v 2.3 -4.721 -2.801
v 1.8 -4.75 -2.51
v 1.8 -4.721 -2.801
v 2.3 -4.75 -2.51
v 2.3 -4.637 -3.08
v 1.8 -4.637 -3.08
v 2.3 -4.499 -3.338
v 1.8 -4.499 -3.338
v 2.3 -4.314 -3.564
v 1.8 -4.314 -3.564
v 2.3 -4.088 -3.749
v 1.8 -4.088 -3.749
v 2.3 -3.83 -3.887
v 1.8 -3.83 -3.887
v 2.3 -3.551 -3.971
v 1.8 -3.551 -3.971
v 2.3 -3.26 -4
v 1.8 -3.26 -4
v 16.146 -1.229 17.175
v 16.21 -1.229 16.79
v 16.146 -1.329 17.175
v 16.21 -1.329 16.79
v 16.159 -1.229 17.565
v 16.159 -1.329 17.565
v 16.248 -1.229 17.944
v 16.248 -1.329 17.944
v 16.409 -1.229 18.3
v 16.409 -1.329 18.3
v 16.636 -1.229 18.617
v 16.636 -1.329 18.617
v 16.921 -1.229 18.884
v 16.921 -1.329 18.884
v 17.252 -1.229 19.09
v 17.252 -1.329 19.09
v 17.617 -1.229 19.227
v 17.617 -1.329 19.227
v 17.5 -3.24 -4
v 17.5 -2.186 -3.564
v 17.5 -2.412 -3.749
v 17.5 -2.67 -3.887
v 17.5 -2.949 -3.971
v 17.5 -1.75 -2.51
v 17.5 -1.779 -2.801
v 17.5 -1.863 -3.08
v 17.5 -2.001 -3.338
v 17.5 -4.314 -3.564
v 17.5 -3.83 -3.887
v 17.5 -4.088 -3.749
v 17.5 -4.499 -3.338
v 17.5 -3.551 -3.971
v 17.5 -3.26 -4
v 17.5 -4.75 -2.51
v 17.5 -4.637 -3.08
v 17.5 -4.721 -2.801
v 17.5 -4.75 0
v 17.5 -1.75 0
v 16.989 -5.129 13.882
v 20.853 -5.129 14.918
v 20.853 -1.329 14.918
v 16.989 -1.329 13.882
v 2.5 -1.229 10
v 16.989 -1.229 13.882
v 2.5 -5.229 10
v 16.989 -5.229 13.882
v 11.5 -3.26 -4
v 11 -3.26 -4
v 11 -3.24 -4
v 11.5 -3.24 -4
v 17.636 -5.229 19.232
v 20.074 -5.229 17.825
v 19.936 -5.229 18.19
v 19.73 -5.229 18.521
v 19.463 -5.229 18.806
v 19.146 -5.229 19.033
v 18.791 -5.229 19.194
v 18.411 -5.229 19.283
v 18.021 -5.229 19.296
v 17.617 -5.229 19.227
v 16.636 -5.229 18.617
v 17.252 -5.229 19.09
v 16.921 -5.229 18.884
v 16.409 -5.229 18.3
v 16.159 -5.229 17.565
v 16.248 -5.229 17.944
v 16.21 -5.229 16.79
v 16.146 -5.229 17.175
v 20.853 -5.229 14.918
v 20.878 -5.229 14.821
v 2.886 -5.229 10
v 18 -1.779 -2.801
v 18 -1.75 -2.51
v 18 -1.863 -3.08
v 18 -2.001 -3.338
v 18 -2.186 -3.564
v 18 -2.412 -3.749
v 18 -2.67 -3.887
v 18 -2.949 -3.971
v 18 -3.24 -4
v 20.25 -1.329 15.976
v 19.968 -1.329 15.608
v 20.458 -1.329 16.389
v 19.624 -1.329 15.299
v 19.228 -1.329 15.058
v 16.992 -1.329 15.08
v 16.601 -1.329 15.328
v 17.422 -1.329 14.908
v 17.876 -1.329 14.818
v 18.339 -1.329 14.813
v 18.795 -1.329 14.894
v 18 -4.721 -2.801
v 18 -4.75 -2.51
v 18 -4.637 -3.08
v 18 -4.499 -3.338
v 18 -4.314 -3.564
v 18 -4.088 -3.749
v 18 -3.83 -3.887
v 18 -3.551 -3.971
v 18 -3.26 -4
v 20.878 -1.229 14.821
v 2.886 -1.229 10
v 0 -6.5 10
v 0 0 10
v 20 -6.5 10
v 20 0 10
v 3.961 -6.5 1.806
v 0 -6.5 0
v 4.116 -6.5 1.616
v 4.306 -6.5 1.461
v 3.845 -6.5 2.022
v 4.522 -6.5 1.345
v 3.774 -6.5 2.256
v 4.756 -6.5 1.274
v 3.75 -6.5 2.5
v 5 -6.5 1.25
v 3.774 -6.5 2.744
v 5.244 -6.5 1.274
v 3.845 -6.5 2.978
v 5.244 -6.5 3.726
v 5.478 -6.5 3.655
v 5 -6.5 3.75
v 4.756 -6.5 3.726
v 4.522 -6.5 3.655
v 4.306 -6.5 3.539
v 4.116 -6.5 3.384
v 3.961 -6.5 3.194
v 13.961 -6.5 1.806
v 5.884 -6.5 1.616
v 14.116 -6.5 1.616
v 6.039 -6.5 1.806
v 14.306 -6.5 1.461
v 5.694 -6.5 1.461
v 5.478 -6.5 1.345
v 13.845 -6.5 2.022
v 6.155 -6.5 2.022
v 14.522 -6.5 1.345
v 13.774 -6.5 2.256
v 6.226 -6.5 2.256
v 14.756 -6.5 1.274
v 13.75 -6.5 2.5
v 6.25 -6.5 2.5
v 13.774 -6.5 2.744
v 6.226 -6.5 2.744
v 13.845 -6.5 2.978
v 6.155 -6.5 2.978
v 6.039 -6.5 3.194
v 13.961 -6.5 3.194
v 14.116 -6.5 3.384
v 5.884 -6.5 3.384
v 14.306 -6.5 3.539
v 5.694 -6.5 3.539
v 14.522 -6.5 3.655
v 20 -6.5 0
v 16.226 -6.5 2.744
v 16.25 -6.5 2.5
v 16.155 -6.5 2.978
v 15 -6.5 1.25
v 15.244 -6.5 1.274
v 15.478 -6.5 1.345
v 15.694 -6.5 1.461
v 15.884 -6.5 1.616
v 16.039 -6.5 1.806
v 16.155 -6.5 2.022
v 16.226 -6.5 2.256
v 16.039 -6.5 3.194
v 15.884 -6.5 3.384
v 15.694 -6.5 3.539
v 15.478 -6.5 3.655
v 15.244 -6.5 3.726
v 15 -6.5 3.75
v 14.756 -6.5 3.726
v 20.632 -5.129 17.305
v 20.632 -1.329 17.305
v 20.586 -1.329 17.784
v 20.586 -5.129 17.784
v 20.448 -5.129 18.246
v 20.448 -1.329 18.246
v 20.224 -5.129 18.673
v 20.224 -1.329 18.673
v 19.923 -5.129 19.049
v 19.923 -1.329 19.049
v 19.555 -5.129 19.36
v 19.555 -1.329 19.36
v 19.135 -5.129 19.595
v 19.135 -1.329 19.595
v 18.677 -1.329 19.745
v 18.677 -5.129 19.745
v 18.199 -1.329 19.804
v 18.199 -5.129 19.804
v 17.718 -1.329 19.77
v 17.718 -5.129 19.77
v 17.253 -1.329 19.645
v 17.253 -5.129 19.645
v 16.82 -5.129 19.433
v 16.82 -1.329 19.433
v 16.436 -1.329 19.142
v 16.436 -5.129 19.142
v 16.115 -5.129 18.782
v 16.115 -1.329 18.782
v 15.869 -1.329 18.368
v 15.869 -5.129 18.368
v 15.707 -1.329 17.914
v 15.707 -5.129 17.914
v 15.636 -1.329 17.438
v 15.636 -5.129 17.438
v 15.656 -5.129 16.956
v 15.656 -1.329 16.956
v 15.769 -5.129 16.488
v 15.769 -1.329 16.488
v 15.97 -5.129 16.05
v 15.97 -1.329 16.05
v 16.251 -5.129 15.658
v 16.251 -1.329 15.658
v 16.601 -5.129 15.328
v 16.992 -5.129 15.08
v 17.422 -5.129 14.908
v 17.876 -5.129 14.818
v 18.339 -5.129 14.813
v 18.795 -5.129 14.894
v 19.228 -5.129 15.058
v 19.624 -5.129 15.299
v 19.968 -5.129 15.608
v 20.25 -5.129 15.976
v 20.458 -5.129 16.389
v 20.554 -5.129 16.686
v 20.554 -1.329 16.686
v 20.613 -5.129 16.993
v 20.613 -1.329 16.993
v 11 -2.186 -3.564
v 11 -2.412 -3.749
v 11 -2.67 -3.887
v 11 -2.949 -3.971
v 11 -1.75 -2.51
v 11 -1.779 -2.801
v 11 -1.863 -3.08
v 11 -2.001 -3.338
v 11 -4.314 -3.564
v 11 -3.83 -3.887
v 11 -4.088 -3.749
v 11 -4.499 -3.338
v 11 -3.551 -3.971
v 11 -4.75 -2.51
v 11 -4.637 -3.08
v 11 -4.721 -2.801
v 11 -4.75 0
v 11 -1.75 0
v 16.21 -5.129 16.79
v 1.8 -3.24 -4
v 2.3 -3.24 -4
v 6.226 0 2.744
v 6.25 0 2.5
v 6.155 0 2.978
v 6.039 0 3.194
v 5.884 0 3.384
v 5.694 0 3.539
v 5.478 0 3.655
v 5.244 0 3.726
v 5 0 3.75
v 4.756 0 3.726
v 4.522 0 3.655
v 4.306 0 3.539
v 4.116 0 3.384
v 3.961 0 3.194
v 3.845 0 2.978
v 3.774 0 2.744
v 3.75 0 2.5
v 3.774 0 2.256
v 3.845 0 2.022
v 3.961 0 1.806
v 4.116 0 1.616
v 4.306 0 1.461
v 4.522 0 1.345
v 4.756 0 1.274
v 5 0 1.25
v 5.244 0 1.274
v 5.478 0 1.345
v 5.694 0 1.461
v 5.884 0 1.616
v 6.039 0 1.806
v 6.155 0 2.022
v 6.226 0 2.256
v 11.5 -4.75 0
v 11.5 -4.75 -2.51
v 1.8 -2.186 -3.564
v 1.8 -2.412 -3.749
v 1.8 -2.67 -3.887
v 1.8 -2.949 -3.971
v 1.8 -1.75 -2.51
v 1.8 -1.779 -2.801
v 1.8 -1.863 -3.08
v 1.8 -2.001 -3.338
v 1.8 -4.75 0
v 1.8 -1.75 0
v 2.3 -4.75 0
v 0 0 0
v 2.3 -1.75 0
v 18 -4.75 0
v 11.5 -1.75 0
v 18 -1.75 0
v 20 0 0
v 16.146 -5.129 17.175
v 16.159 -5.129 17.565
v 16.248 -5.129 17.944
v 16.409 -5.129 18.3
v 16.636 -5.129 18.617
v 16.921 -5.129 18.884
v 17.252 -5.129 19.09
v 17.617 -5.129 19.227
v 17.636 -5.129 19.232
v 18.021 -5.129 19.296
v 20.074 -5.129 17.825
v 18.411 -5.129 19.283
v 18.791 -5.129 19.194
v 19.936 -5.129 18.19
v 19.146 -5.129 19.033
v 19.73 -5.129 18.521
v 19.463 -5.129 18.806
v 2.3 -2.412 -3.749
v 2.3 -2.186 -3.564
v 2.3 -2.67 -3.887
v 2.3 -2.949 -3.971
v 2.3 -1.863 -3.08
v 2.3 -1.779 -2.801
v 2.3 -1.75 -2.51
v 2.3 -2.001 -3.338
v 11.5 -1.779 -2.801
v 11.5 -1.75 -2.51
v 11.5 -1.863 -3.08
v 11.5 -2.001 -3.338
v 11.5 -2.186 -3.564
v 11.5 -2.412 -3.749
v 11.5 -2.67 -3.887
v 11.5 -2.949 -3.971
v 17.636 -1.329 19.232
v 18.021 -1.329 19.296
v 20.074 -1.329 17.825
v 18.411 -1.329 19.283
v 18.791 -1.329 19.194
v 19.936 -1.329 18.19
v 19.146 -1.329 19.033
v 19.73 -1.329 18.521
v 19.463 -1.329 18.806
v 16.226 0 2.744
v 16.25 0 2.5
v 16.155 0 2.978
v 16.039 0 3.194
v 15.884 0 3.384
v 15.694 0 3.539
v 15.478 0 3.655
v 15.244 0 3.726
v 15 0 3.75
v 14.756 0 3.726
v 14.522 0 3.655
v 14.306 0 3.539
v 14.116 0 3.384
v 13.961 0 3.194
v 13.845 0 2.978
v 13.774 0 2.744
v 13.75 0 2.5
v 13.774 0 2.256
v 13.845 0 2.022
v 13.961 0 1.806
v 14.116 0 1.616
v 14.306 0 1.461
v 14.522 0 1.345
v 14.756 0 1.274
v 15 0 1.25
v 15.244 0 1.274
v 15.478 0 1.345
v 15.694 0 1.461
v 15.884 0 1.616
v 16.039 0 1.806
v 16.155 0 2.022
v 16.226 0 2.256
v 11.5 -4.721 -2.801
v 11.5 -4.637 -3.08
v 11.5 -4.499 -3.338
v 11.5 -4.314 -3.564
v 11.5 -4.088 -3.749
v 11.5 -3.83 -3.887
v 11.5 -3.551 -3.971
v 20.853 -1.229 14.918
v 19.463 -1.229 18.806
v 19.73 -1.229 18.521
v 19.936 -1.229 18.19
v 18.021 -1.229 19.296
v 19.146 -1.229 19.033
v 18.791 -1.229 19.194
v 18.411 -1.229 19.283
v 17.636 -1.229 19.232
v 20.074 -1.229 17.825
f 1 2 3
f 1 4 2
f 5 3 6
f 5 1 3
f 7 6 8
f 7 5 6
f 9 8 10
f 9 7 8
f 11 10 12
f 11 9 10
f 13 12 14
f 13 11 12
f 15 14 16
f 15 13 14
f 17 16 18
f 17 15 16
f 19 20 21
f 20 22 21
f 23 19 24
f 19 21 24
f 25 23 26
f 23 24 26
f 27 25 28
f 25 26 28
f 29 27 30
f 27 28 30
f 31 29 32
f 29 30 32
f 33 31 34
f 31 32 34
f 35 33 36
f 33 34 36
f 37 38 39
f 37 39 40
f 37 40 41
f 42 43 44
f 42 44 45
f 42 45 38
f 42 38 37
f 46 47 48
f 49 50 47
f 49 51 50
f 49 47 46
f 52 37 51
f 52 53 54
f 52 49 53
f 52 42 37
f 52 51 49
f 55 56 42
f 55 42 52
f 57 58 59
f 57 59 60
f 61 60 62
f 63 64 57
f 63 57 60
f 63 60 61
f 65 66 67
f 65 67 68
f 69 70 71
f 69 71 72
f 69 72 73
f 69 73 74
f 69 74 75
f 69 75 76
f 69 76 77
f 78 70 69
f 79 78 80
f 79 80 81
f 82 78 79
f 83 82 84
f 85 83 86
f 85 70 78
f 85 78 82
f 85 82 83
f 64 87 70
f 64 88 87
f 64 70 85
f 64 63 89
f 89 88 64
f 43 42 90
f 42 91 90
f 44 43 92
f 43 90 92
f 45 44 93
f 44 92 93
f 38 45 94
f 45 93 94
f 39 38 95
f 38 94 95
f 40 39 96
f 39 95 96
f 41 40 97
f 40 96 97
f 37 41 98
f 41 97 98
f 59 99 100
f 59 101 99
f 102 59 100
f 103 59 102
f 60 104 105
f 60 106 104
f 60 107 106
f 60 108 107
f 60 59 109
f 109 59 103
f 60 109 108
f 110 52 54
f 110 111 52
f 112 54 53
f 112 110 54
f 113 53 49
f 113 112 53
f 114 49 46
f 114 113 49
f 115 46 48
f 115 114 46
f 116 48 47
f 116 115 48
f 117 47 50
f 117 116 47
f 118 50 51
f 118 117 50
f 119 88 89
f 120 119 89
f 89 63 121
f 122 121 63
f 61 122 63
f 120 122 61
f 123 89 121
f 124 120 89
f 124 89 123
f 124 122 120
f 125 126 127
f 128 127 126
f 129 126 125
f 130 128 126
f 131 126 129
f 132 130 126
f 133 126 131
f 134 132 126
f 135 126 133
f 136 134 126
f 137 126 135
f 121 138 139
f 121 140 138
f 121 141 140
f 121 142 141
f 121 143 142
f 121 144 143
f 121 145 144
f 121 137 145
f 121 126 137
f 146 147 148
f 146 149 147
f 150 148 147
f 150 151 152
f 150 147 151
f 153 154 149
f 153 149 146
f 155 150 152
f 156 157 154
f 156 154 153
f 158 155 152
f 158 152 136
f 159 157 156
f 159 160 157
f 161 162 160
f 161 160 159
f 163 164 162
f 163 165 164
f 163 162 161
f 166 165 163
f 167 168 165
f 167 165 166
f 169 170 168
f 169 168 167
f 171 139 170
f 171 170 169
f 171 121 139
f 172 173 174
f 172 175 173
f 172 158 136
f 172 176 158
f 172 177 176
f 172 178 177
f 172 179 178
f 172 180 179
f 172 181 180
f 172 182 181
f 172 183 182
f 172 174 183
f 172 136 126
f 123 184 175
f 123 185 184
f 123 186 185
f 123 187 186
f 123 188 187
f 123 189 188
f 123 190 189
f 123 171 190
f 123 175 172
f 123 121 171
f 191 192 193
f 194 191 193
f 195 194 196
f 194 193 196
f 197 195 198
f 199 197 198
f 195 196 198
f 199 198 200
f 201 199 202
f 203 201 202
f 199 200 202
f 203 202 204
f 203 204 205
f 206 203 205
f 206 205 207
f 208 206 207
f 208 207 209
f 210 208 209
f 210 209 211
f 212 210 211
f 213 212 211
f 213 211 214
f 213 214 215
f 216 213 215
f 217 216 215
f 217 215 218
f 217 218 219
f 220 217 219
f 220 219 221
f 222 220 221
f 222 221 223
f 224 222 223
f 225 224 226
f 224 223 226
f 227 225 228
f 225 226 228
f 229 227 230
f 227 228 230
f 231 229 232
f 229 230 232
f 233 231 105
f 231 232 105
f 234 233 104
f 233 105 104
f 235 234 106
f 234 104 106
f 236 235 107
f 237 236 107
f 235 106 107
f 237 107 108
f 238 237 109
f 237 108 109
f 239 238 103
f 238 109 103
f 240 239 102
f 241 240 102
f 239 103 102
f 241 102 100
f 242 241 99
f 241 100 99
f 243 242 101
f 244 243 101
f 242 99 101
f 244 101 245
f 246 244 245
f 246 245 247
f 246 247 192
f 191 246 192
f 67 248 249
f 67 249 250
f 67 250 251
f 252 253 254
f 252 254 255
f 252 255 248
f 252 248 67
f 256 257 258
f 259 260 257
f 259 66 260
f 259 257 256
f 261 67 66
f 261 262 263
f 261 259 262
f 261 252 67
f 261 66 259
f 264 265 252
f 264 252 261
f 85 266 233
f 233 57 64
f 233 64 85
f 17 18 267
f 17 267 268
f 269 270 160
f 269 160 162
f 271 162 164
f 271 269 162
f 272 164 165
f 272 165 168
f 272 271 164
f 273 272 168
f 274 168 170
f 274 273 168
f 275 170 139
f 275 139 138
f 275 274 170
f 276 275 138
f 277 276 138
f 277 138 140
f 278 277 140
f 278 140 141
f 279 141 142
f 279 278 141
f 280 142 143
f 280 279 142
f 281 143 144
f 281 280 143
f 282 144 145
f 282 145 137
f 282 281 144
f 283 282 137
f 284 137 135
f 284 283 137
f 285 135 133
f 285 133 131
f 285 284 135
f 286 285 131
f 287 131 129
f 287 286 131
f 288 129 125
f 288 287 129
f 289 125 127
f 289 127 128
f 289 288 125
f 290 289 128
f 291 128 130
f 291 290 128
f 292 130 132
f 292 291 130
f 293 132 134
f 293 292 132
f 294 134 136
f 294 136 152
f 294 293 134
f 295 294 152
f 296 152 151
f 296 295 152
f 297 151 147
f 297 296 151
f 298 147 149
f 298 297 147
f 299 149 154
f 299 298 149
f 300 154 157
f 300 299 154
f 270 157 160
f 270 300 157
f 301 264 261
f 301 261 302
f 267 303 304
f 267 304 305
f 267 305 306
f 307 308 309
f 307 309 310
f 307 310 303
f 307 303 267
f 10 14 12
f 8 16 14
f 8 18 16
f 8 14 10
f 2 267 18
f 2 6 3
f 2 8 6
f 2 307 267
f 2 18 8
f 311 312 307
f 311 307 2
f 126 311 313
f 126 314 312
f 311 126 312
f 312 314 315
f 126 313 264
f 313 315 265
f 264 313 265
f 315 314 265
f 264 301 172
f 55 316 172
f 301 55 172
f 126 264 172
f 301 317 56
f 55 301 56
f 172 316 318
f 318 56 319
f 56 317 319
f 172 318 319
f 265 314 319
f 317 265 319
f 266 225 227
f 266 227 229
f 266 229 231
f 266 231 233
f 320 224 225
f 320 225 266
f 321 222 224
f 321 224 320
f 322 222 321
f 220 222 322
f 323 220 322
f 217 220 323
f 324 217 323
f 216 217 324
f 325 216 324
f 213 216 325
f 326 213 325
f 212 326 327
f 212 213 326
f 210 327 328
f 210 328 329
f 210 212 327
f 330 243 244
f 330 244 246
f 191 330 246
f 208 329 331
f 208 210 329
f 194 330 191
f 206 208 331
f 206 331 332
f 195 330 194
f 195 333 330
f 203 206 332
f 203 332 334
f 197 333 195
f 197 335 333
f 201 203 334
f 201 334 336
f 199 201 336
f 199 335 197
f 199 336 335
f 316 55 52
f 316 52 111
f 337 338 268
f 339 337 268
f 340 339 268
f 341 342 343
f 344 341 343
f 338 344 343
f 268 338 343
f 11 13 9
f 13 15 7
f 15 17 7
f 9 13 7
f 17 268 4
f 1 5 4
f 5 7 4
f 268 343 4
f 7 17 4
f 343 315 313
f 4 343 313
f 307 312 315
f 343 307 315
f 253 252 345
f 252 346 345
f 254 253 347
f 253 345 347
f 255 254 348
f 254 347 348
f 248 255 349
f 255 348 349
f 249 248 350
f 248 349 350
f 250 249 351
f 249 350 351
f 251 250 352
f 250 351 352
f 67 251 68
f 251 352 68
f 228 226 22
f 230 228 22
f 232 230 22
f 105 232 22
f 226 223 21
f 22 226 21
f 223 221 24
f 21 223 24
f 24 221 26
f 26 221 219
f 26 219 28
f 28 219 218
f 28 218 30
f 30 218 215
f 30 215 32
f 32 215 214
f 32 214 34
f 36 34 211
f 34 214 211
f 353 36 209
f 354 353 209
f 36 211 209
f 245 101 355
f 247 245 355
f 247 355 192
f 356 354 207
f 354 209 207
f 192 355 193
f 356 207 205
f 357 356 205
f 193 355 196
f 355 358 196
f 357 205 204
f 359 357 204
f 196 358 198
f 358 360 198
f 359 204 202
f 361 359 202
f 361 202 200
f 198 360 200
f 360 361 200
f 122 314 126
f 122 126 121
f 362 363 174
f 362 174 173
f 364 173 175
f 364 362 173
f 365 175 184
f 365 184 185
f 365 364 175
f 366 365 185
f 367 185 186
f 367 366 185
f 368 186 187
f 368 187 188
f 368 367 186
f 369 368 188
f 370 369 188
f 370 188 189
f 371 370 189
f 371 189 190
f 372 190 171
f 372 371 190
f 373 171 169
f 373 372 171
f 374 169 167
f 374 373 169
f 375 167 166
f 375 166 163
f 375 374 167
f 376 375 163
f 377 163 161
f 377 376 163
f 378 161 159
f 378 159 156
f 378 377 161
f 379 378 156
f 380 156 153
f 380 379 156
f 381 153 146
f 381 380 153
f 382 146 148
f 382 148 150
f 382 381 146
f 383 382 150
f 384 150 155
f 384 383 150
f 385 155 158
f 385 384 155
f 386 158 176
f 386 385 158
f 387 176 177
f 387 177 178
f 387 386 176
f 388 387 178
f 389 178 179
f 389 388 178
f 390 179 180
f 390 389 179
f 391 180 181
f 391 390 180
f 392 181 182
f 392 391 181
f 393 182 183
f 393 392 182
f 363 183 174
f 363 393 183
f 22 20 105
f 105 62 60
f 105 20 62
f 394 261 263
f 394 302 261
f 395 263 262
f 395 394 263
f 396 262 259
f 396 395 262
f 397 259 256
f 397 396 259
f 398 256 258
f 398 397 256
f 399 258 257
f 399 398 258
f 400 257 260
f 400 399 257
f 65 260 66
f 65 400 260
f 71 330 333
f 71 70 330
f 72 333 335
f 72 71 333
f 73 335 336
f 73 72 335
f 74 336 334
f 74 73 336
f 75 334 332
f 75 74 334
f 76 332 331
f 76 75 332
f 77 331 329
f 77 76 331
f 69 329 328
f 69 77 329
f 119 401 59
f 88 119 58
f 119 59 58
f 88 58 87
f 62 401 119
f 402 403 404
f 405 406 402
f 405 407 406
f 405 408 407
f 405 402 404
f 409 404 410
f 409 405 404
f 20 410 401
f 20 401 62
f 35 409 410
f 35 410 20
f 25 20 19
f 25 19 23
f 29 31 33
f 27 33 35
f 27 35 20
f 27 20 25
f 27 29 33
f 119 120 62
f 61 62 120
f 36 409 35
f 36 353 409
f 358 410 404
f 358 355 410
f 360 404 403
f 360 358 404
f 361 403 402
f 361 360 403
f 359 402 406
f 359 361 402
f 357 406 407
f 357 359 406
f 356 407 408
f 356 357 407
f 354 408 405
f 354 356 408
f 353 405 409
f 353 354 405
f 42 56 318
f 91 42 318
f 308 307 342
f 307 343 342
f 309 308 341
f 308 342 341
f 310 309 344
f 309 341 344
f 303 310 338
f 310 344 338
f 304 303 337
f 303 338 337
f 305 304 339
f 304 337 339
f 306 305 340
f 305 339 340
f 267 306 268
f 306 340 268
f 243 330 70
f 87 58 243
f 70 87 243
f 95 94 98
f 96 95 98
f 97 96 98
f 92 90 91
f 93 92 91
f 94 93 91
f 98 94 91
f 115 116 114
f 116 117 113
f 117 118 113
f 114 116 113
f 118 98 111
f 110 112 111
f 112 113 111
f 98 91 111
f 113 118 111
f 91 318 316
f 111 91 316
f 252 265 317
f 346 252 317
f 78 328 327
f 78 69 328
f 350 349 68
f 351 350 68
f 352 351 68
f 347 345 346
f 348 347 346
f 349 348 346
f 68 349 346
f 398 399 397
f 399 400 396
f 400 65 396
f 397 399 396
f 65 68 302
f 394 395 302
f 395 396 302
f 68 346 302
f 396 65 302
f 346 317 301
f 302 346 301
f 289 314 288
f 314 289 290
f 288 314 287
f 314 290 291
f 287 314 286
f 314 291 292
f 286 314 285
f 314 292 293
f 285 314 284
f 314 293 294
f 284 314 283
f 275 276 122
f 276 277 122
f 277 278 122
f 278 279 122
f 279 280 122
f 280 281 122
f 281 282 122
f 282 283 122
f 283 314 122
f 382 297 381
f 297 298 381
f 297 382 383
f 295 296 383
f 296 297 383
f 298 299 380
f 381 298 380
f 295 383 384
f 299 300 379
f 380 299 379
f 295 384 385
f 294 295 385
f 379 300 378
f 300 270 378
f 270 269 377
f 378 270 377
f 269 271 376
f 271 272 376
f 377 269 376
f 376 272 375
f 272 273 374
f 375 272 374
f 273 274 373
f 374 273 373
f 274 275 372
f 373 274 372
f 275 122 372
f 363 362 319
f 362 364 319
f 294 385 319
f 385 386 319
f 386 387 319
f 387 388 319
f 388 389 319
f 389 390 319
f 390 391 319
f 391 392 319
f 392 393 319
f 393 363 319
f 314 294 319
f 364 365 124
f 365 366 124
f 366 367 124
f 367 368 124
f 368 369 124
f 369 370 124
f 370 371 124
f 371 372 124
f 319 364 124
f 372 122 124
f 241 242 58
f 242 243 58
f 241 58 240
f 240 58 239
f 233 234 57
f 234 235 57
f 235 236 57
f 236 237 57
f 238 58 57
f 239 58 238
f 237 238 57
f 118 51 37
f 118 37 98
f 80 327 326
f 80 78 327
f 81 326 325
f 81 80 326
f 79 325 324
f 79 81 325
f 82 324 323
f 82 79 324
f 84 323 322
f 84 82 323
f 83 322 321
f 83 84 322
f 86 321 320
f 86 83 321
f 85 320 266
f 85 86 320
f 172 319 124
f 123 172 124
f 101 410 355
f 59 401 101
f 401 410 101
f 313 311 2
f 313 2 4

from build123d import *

# Parameters (mm, degrees)
SKETCH_W     = 20
SKETCH_H     = 10
SKETCH_R     = 1.25
PAD_DEPTH    = 6.5
SKETCH001_W  = 19
SKETCH001_H  = 4
PAD001_DEPTH = 0.1
SKETCH002_W  = 4
SKETCH002_H  = 0.1
PAD002_DEPTH = 5
FILLET_R     = 1.99
SKETCH003_R  = 2.5
PAD003_DEPTH = 3.8
SKETCH004_W  = 0.5
SKETCH004_H  = 3
PAD004_DEPTH = 4
FILLET001_R  = 1.49


with BuildPart() as part:
    # Sketch → Pad (new body)
    with BuildSketch(Plane.XZ):
        with Locations((10, 5)):
            Rectangle(SKETCH_W, SKETCH_H)
        with Locations((5, 2.5)):
            Circle(SKETCH_R, mode=Mode.SUBTRACT)
        with Locations((15, 2.5)):
            Circle(SKETCH_R, mode=Mode.SUBTRACT)
    extrude(amount=PAD_DEPTH)

    # Sketch001 (on Face3 of Pad) → Pad001 (join)
    with BuildSketch(Plane(origin=(2.5, 1.5, 10), x_dir=(-0.965926, 0, -0.258819), z_dir=(-0.258819, 0, 0.965926))):
        with Locations((-9.5, 4.728916)):
            Rectangle(SKETCH001_W, SKETCH001_H)
    extrude(amount=-PAD001_DEPTH)

    # Sketch002 (on Face12 of Pad001) → Pad002 (join)
    with BuildSketch(Plane(origin=(-2.332532, 0, 8.705127), x_dir=(-0.965926, 0, -0.258819), z_dir=(-0.258819, 0, 0.965926))):
        with Locations((-22.003005, 5.178916)):
            Rectangle(SKETCH002_W, SKETCH002_H)
        with Locations((-22.003005, 1.278916)):
            Rectangle(SKETCH002_W, SKETCH002_H)
    extrude(amount=PAD002_DEPTH)

    # Fillet
    fillet_edges = [part.edges().sort_by_distance(p)[0] for p in [
        (19.558495, -5.178916, 19.747191),
        (15.694792, -5.178916, 18.711915),
        (15.694792, -1.278916, 18.711915),
        (19.558495, -1.278916, 19.747191),
    ]]
    fillet(fillet_edges, radius=FILLET_R)

    # Sketch003 (on Face5 of Fillet) → Pad003 (join)
    with BuildSketch(Plane.XZ.offset(1.328916)):
        with Locations((18.132034, 17.304772)):
            Circle(SKETCH003_R)
    extrude(amount=PAD003_DEPTH)

    # Sketch004 (on Face24 of Pad003) → Pad004 (join)
    with BuildSketch(Plane(origin=(0, 0, 0), x_dir=(1, 0, 0), z_dir=(0, 0, -1))):
        with Locations((17.75, 3.25)):
            Rectangle(SKETCH004_W, SKETCH004_H)
        with Locations((11.25, 3.25)):
            Rectangle(SKETCH004_W, SKETCH004_H)
        with Locations((2.05, 3.25)):
            Rectangle(SKETCH004_W, SKETCH004_H)
    extrude(amount=PAD004_DEPTH)

    # Fillet001
    fillet001_edges = [part.edges().sort_by_distance(p)[0] for p in [
        (2.05, -4.75, -4),
        (2.05, -1.75, -4),
        (11.25, -4.75, -4),
        (11.25, -1.75, -4),
        (17.75, -4.75, -4),
        (17.75, -1.75, -4),
    ]]
    fillet(fillet001_edges, radius=FILLET001_R)


solid = part.part
